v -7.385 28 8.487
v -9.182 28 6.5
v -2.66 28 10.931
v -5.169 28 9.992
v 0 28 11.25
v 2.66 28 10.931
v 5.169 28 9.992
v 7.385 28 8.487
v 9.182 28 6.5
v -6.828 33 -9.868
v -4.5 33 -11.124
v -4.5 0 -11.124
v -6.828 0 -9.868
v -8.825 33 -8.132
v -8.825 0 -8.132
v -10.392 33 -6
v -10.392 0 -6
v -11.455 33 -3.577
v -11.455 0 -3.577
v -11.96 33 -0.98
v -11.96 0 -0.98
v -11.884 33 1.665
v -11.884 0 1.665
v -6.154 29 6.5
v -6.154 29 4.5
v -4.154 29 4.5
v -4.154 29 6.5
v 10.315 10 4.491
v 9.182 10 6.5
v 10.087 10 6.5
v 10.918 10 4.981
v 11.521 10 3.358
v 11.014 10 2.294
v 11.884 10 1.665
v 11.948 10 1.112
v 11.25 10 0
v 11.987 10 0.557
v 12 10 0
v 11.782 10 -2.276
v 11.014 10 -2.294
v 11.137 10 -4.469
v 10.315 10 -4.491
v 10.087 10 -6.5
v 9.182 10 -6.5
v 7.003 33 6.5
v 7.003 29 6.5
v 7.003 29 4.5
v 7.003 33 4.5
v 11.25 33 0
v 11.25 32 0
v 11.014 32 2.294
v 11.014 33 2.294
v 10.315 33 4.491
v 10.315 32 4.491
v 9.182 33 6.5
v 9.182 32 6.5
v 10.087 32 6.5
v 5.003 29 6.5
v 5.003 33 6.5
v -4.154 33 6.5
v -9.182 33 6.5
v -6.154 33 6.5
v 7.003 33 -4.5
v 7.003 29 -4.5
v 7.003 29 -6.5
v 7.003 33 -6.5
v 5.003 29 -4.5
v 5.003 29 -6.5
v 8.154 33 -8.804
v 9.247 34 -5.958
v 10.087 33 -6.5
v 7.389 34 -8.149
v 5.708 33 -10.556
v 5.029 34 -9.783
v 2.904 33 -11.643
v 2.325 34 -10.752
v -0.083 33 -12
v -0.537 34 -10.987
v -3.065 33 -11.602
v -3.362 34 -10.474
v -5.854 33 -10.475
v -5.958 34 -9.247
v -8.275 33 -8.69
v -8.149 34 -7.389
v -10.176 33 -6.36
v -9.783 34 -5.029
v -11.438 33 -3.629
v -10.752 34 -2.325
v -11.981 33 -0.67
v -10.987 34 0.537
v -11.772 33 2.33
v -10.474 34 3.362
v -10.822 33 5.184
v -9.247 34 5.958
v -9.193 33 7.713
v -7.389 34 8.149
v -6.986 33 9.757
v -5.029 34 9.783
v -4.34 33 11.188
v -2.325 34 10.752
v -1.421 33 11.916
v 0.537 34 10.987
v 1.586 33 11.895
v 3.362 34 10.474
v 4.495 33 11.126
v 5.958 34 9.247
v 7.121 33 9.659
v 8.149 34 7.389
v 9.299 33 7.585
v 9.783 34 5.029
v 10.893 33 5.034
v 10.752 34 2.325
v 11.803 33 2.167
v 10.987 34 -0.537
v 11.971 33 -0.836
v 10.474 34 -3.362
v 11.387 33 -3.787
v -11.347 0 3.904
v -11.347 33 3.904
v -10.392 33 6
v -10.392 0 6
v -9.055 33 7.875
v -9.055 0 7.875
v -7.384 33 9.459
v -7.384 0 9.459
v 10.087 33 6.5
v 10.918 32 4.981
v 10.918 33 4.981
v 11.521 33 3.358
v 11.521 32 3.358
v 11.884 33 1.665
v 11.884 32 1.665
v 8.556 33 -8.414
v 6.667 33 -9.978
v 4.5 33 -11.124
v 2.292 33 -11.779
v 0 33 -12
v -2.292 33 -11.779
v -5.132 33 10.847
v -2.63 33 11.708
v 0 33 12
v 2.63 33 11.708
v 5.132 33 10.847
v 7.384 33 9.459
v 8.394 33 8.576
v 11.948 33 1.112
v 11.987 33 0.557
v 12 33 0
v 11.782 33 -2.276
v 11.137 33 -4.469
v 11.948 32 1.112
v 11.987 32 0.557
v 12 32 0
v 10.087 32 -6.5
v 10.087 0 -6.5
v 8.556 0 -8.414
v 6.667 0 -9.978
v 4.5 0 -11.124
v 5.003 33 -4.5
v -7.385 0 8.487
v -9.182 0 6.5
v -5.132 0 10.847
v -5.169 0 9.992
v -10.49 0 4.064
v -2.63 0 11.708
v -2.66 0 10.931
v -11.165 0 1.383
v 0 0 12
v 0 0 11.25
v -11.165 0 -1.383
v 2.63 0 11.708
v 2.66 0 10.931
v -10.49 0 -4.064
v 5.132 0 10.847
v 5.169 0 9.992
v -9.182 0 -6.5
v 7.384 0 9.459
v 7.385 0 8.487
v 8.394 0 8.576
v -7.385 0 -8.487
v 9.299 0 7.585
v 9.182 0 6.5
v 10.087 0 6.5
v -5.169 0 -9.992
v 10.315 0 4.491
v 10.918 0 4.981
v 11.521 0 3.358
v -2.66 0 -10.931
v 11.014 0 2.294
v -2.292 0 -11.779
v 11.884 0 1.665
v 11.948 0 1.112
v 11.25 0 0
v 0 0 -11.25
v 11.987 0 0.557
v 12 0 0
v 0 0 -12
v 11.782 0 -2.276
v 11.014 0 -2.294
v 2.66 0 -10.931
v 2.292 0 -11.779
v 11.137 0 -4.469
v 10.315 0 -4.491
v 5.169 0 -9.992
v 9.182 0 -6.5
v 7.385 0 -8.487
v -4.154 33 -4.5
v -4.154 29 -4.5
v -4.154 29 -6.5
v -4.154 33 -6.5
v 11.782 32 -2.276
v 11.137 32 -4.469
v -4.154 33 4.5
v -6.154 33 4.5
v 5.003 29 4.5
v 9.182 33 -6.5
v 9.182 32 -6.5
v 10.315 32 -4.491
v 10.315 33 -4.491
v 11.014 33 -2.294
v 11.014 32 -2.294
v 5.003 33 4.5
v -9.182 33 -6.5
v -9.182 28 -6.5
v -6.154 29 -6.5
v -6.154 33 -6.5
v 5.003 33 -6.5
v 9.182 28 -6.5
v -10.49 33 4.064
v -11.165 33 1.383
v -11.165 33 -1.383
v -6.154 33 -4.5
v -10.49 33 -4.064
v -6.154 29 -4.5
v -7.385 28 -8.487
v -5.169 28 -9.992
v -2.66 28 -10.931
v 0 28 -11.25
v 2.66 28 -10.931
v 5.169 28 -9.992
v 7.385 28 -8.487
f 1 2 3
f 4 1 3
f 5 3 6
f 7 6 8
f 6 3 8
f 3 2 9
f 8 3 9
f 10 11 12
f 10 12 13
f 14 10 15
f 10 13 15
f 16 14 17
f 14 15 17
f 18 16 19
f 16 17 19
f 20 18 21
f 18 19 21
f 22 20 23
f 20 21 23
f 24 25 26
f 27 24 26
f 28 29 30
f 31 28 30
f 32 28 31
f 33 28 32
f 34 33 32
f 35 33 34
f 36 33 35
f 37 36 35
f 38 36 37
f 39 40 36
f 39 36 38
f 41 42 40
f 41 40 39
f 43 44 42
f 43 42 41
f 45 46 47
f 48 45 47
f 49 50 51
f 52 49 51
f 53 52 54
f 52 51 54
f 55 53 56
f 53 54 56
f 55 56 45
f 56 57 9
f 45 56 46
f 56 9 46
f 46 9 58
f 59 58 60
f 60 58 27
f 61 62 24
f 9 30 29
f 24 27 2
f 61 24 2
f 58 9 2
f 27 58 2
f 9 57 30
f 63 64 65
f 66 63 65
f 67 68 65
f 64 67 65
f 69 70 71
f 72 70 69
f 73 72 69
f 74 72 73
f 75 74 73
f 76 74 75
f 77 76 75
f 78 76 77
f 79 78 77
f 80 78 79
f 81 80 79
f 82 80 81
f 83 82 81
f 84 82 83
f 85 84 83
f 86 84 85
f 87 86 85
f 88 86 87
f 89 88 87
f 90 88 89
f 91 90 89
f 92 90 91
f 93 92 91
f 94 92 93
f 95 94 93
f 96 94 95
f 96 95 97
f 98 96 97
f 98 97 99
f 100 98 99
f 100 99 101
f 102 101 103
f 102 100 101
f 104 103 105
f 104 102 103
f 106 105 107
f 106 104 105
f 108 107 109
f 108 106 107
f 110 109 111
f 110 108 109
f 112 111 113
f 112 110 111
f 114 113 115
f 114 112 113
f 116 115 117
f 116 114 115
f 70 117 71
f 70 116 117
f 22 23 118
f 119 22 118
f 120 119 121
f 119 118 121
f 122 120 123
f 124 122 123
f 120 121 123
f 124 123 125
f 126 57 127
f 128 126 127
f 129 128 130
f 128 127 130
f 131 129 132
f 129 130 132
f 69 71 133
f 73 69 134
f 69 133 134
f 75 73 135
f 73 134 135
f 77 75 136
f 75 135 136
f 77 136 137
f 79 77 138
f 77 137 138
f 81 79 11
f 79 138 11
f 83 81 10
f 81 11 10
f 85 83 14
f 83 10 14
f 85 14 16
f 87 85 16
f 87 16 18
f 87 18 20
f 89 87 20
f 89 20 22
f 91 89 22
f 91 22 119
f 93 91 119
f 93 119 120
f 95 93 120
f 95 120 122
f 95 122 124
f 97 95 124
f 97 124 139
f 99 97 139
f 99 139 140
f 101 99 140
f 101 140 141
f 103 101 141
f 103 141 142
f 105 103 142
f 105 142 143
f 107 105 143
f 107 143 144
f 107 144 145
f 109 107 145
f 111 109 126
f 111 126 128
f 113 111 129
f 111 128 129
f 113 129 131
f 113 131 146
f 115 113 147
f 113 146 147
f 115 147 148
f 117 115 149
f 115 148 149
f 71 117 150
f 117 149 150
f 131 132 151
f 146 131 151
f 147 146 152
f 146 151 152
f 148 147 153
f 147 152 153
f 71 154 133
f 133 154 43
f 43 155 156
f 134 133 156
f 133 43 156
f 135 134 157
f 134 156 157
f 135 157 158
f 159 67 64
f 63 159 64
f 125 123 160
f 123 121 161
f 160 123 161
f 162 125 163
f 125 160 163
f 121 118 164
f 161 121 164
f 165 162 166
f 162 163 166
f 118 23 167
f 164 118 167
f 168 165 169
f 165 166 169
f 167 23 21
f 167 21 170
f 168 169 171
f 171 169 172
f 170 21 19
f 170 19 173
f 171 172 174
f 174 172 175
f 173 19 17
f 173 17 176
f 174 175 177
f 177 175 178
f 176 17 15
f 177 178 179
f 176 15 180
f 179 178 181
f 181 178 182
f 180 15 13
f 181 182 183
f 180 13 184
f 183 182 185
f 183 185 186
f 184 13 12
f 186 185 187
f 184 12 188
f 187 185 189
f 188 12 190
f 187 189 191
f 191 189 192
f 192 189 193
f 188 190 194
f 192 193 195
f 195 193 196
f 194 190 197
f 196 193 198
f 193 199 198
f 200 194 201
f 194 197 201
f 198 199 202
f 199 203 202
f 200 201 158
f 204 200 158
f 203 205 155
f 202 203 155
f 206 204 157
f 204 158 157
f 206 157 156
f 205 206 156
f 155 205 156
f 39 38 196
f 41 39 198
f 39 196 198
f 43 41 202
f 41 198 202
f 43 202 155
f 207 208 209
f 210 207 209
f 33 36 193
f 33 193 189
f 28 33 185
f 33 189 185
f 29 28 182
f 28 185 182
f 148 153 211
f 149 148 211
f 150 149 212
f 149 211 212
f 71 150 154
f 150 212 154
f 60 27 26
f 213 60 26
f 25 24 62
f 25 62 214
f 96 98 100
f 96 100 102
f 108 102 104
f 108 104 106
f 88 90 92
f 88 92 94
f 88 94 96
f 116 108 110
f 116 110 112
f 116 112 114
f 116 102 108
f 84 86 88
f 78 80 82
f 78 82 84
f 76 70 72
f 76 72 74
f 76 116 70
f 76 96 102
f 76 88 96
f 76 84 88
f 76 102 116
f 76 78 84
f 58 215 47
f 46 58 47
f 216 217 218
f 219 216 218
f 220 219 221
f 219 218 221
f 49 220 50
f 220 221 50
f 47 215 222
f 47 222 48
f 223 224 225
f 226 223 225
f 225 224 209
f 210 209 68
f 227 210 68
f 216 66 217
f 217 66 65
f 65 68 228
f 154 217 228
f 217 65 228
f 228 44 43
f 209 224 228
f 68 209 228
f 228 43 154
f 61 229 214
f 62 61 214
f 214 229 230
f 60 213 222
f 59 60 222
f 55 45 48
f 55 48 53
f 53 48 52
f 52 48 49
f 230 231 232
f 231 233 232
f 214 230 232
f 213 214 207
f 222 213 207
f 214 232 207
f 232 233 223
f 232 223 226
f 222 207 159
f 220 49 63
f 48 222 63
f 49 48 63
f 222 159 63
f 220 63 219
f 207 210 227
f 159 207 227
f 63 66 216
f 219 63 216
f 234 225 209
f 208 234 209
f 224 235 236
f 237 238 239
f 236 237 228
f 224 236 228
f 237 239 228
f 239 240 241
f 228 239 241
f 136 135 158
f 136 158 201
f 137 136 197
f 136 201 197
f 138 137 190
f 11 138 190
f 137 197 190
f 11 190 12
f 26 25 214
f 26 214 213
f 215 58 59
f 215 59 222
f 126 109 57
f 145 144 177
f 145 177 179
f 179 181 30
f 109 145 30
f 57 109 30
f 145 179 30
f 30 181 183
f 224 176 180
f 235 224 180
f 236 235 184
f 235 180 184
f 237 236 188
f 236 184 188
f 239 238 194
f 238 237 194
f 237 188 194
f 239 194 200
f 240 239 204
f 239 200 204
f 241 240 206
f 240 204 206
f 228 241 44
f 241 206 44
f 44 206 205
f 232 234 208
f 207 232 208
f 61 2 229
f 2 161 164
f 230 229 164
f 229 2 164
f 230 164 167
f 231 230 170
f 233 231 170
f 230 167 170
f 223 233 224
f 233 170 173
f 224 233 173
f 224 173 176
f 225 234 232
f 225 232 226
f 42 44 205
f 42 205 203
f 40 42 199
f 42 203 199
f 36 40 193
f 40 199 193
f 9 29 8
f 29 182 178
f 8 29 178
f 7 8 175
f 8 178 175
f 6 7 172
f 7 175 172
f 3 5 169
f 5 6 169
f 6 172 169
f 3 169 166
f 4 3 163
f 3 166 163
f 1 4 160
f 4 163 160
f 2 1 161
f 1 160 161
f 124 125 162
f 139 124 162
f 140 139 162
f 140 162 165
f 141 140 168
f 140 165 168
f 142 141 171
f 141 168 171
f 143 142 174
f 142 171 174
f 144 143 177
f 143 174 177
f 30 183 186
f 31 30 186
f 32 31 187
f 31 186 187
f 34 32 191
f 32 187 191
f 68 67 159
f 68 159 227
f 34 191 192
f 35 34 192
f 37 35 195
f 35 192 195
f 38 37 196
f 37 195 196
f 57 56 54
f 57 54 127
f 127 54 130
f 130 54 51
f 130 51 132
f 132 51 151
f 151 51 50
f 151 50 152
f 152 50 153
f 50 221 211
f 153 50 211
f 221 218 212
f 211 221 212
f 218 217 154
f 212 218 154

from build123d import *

# Parameters (mm, degrees)
BOSS_EXTRUDE1_DEPTH = 33
BOSS_EXTRUDE2_START = 32
BOSS_EXTRUDE2_DEPTH = 1
BOSS_EXTRUDE3_START = 33
SKETCH1_7_R         = 12
BOSS_EXTRUDE3_DEPTH = 1
CHAMFER1_SIZE       = 1
BOSS_EXTRUDE4_DEPTH = 10
BOSS_EXTRUDE5_START = 29
SKETCH1_9_W         = 2
SKETCH1_9_H         = 2
BOSS_EXTRUDE5_DEPTH = 4
BOSS_EXTRUDE6_START = 28
BOSS_EXTRUDE6_DEPTH = 5


with BuildPart() as part:
    # Sketch1 → Boss-Extrude1 (new body)
    with BuildSketch(Plane(origin=(0, 0, 0), x_dir=(1, 0, 0), z_dir=(0, 1, 0))):
        with BuildLine():
            ThreePointArc((7.383924434, -9.459263182), (8.859947089, -8.093289663), (10.087120501, -6.5))
            Line((10.087120501, -6.5), (9.182183836, -6.5))
            ThreePointArc((9.182183836, -6.5), (0, -11.25), (-9.182183836, -6.5))
            ThreePointArc((-9.182183836, -6.5), (-11.25, 0), (-9.182183836, 6.5))
            ThreePointArc((-9.182183836, 6.5), (0, 11.25), (9.182183836, 6.5))
            Line((9.182183836, 6.5), (10.087120501, 6.5))
            ThreePointArc((10.087120501, 6.5), (7.6512779, 9.244346732), (4.5, 11.124297731))
            ThreePointArc((4.5, 11.124297731), (0, 12), (-4.5, 11.124297731))
            ThreePointArc((-4.5, 11.124297731), (-10.392304845, 6), (-11.883924434, -1.665034548))
            ThreePointArc((-11.883924434, -1.665034548), (-10.392304845, -6), (-7.383924434, -9.459263182))
            ThreePointArc((-7.383924434, -9.459263182), (0, -12), (7.383924434, -9.459263182))
        make_face()
    extrude(amount=BOSS_EXTRUDE1_DEPTH)



with BuildPart() as body_2:
    # Sketch1<6> → Boss-Extrude2 (new body)
    with BuildSketch(Plane(origin=(0, 0, 0), x_dir=(1, 0, 0), z_dir=(0, 1, 0)).offset(BOSS_EXTRUDE2_START)):
        with BuildLine():
            ThreePointArc((10.087120501, -6.5), (11.248374399, -4.180200161), (11.883924434, -1.665034548))
            ThreePointArc((11.883924434, -1.665034548), (11.970945936, -0.834537834), (12, 0))
            ThreePointArc((12, 0), (11.511851415, 3.387813011), (10.087120501, 6.5))
            Line((10.087120501, 6.5), (9.182183836, 6.5))
            ThreePointArc((9.182183836, 6.5), (10.72058926, 3.410493501), (11.25, 0))
            ThreePointArc((11.25, 0), (10.72058926, -3.410493501), (9.182183836, -6.5))
            Line((9.182183836, -6.5), (10.087120501, -6.5))
        make_face()
    extrude(amount=BOSS_EXTRUDE2_DEPTH)


with BuildPart() as part_1:
    add(part.part)

    add(body_2.part)  # Boss-Extrude3 merges body 2
    # Sketch1<7> → Boss-Extrude3 (add)
    with BuildSketch(Plane(origin=(0, 0, 0), x_dir=(1, 0, 0), z_dir=(0, 1, 0)).offset(BOSS_EXTRUDE3_START)):
        with Locations(Location((0, 0, 0), (0, 0, 32.797168296))):
            Circle(SKETCH1_7_R)
    extrude(amount=BOSS_EXTRUDE3_DEPTH)

    # Chamfer1
    chamfer1_edges = [part_1.edges().sort_by_distance(p)[0] for p in [
        (-10.087120501, 34, 6.5),
    ]]
    chamfer(chamfer1_edges, length=CHAMFER1_SIZE - 0.0001)  # a hair under: the kernel refuses the full size

    # Sketch1<8> → Boss-Extrude4 (add)
    with BuildSketch(Plane(origin=(0, 0, 0), x_dir=(1, 0, 0), z_dir=(0, 1, 0))):
        with BuildLine():
            ThreePointArc((10.087120501, -6.5), (11.248374399, -4.180200161), (11.883924434, -1.665034548))
            ThreePointArc((11.883924434, -1.665034548), (11.970945936, -0.834537834), (12, 0))
            ThreePointArc((12, 0), (11.511851415, 3.387813011), (10.087120501, 6.5))
            Line((10.087120501, 6.5), (9.182183836, 6.5))
            ThreePointArc((9.182183836, 6.5), (10.72058926, 3.410493501), (11.25, 0))
            ThreePointArc((11.25, 0), (10.72058926, -3.410493501), (9.182183836, -6.5))
            Line((9.182183836, -6.5), (10.087120501, -6.5))
        make_face()
        with BuildLine():
            ThreePointArc((7.383924434, -9.459263182), (8.859947089, -8.093289663), (10.087120501, -6.5))
            Line((10.087120501, -6.5), (9.182183836, -6.5))
            ThreePointArc((9.182183836, -6.5), (0, -11.25), (-9.182183836, -6.5))
            ThreePointArc((-9.182183836, -6.5), (-11.25, 0), (-9.182183836, 6.5))
            ThreePointArc((-9.182183836, 6.5), (0, 11.25), (9.182183836, 6.5))
            Line((9.182183836, 6.5), (10.087120501, 6.5))
            ThreePointArc((10.087120501, 6.5), (7.6512779, 9.244346732), (4.5, 11.124297731))
            ThreePointArc((4.5, 11.124297731), (0, 12), (-4.5, 11.124297731))
            ThreePointArc((-4.5, 11.124297731), (-10.392304845, 6), (-11.883924434, -1.665034548))
            ThreePointArc((-11.883924434, -1.665034548), (-10.392304845, -6), (-7.383924434, -9.459263182))
            ThreePointArc((-7.383924434, -9.459263182), (0, -12), (7.383924434, -9.459263182))
        make_face()
    extrude(amount=BOSS_EXTRUDE4_DEPTH)

    # Sketch1<9> → Boss-Extrude5 (add)
    with BuildSketch(Plane(origin=(0, 0, 0), x_dir=(1, 0, 0), z_dir=(0, 1, 0)).offset(BOSS_EXTRUDE5_START)):
        with Locations((-5.154076544, -5.5)):
            Rectangle(SKETCH1_9_W, SKETCH1_9_H)
        with Locations((6.003328083, -5.5)):
            Rectangle(SKETCH1_9_W, SKETCH1_9_H)
        with Locations((6.003328083, 5.5)):
            Rectangle(SKETCH1_9_W, SKETCH1_9_H)
        with Locations((-5.154076544, 5.5)):
            Rectangle(SKETCH1_9_W, SKETCH1_9_H)
    extrude(amount=BOSS_EXTRUDE5_DEPTH)

    # Sketch1<11> → Boss-Extrude6 (add)
    with BuildSketch(Plane(origin=(0, 0, 0), x_dir=(1, 0, 0), z_dir=(0, 1, 0)).offset(BOSS_EXTRUDE6_START)):
        with BuildLine():
            ThreePointArc((-9.182183836, -6.5), (0, -11.25), (9.182183836, -6.5))
            Line((9.182183836, -6.5), (7.003328083, -6.5))
            Line((7.003328083, -6.5), (5.003328083, -6.5))
            Line((5.003328083, -6.5), (0, -6.5))
            Line((0, -6.5), (-4.154076544, -6.5))
            Line((-4.154076544, -6.5), (-6.154076544, -6.5))
            Line((-6.154076544, -6.5), (-9.182183836, -6.5))
        make_face()
        with BuildLine():
            Line((7.003328083, 6.5), (9.182183836, 6.5))
            ThreePointArc((9.182183836, 6.5), (0, 11.25), (-9.182183836, 6.5))
            Line((-9.182183836, 6.5), (-6.154076544, 6.5))
            Line((-6.154076544, 6.5), (-4.154076544, 6.5))
            Line((-4.154076544, 6.5), (0, 6.5))
            Line((0, 6.5), (5.003328083, 6.5))
            Line((5.003328083, 6.5), (7.003328083, 6.5))
        make_face()
    extrude(amount=BOSS_EXTRUDE6_DEPTH)


solid = part_1.part
